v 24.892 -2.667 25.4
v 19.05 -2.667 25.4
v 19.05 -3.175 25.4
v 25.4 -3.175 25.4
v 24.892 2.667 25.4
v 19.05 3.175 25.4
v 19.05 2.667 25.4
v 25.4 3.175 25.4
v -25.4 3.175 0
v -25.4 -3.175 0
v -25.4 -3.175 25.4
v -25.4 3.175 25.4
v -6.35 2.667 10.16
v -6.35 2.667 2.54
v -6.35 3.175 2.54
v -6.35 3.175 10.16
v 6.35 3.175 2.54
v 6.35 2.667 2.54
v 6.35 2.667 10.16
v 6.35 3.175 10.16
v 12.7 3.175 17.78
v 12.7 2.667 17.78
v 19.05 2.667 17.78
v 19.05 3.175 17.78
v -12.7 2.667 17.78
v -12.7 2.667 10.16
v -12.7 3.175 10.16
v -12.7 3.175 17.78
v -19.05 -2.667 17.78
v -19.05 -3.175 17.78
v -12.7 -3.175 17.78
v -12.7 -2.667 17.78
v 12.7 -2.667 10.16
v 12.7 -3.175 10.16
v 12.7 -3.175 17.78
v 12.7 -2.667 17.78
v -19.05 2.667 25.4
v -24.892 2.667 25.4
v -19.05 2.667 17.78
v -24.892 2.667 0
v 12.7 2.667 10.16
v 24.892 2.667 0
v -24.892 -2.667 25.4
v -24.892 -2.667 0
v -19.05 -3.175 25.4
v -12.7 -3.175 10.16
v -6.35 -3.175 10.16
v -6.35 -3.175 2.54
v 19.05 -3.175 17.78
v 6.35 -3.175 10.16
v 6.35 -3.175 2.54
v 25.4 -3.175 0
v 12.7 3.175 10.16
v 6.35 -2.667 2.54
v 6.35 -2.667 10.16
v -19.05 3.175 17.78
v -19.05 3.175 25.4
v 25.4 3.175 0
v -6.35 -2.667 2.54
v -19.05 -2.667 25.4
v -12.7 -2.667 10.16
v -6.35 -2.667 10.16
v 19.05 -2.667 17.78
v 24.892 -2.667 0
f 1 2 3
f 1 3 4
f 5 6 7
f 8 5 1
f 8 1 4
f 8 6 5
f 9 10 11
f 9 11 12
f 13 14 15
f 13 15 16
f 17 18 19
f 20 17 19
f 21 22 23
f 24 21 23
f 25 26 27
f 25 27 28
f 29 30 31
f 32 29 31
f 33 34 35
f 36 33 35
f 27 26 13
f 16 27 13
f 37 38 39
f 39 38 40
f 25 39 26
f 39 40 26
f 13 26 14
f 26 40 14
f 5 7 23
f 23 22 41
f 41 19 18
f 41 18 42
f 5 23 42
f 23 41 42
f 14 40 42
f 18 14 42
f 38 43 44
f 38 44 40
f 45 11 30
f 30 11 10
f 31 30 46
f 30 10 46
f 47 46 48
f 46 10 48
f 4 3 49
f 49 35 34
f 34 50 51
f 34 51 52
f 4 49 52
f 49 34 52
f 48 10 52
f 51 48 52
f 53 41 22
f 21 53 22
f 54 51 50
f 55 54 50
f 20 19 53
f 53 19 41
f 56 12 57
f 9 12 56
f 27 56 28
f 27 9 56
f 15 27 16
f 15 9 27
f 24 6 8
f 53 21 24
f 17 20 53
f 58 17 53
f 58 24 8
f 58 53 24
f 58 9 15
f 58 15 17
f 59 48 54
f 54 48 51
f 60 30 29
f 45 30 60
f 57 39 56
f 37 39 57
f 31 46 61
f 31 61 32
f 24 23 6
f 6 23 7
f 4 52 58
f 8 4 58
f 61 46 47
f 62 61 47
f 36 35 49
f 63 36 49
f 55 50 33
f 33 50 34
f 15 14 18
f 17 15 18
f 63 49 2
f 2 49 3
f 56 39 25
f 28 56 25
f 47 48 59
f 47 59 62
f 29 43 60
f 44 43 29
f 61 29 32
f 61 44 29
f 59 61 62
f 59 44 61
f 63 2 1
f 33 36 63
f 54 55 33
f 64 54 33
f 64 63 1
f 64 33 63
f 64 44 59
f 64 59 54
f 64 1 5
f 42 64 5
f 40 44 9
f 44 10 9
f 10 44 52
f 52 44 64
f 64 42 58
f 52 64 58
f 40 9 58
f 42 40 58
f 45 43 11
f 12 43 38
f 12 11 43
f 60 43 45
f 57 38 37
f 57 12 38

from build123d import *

# Parameters (mm, degrees)
F0_W     = 50.8
F0_H     = 6.35
F1_DEPTH = 25.4
F2_T     = -0.508
F3_W     = 6.35
F3_H     = 7.62
F3_W_2   = 12.7
F4_DEPTH = 13.208


with BuildPart() as f1:
    # F0 (on Top) → F1 (new body)
    with BuildSketch(Plane.XY):
        Rectangle(F0_W, F0_H)
    extrude(amount=F1_DEPTH)

    # F2
    f2_openings = [f1.faces().sort_by_distance(p)[0] for p in [
        (0, 0, 25.4),
        (0, 0, 0),
    ]]
    offset(amount=F2_T, openings=f2_openings)

    # F3 (on face) → F4 (cut)
    with BuildSketch(Plane.XZ.offset(3.175)):
        with Locations((-15.875, 21.59)):
            Rectangle(F3_W, F3_H)
        with Locations((-9.525, 21.59)):
            Rectangle(F3_W, F3_H)
        with Locations((0, 21.59)):
            Rectangle(F3_W_2, F3_H)
        with Locations((-9.525, 13.97)):
            Rectangle(F3_W, F3_H)
        with Locations((9.525, 21.59)):
            Rectangle(F3_W, F3_H)
        with Locations((0, 13.97)):
            Rectangle(F3_W_2, F3_H)
        with Locations((15.875, 21.59)):
            Rectangle(F3_W, F3_H)
        with Locations((9.525, 13.97)):
            Rectangle(F3_W, F3_H)
        with Locations((0, 6.35)):
            Rectangle(F3_W_2, F3_H)
    extrude(amount=-F4_DEPTH, mode=Mode.SUBTRACT)


solid = f1.part
